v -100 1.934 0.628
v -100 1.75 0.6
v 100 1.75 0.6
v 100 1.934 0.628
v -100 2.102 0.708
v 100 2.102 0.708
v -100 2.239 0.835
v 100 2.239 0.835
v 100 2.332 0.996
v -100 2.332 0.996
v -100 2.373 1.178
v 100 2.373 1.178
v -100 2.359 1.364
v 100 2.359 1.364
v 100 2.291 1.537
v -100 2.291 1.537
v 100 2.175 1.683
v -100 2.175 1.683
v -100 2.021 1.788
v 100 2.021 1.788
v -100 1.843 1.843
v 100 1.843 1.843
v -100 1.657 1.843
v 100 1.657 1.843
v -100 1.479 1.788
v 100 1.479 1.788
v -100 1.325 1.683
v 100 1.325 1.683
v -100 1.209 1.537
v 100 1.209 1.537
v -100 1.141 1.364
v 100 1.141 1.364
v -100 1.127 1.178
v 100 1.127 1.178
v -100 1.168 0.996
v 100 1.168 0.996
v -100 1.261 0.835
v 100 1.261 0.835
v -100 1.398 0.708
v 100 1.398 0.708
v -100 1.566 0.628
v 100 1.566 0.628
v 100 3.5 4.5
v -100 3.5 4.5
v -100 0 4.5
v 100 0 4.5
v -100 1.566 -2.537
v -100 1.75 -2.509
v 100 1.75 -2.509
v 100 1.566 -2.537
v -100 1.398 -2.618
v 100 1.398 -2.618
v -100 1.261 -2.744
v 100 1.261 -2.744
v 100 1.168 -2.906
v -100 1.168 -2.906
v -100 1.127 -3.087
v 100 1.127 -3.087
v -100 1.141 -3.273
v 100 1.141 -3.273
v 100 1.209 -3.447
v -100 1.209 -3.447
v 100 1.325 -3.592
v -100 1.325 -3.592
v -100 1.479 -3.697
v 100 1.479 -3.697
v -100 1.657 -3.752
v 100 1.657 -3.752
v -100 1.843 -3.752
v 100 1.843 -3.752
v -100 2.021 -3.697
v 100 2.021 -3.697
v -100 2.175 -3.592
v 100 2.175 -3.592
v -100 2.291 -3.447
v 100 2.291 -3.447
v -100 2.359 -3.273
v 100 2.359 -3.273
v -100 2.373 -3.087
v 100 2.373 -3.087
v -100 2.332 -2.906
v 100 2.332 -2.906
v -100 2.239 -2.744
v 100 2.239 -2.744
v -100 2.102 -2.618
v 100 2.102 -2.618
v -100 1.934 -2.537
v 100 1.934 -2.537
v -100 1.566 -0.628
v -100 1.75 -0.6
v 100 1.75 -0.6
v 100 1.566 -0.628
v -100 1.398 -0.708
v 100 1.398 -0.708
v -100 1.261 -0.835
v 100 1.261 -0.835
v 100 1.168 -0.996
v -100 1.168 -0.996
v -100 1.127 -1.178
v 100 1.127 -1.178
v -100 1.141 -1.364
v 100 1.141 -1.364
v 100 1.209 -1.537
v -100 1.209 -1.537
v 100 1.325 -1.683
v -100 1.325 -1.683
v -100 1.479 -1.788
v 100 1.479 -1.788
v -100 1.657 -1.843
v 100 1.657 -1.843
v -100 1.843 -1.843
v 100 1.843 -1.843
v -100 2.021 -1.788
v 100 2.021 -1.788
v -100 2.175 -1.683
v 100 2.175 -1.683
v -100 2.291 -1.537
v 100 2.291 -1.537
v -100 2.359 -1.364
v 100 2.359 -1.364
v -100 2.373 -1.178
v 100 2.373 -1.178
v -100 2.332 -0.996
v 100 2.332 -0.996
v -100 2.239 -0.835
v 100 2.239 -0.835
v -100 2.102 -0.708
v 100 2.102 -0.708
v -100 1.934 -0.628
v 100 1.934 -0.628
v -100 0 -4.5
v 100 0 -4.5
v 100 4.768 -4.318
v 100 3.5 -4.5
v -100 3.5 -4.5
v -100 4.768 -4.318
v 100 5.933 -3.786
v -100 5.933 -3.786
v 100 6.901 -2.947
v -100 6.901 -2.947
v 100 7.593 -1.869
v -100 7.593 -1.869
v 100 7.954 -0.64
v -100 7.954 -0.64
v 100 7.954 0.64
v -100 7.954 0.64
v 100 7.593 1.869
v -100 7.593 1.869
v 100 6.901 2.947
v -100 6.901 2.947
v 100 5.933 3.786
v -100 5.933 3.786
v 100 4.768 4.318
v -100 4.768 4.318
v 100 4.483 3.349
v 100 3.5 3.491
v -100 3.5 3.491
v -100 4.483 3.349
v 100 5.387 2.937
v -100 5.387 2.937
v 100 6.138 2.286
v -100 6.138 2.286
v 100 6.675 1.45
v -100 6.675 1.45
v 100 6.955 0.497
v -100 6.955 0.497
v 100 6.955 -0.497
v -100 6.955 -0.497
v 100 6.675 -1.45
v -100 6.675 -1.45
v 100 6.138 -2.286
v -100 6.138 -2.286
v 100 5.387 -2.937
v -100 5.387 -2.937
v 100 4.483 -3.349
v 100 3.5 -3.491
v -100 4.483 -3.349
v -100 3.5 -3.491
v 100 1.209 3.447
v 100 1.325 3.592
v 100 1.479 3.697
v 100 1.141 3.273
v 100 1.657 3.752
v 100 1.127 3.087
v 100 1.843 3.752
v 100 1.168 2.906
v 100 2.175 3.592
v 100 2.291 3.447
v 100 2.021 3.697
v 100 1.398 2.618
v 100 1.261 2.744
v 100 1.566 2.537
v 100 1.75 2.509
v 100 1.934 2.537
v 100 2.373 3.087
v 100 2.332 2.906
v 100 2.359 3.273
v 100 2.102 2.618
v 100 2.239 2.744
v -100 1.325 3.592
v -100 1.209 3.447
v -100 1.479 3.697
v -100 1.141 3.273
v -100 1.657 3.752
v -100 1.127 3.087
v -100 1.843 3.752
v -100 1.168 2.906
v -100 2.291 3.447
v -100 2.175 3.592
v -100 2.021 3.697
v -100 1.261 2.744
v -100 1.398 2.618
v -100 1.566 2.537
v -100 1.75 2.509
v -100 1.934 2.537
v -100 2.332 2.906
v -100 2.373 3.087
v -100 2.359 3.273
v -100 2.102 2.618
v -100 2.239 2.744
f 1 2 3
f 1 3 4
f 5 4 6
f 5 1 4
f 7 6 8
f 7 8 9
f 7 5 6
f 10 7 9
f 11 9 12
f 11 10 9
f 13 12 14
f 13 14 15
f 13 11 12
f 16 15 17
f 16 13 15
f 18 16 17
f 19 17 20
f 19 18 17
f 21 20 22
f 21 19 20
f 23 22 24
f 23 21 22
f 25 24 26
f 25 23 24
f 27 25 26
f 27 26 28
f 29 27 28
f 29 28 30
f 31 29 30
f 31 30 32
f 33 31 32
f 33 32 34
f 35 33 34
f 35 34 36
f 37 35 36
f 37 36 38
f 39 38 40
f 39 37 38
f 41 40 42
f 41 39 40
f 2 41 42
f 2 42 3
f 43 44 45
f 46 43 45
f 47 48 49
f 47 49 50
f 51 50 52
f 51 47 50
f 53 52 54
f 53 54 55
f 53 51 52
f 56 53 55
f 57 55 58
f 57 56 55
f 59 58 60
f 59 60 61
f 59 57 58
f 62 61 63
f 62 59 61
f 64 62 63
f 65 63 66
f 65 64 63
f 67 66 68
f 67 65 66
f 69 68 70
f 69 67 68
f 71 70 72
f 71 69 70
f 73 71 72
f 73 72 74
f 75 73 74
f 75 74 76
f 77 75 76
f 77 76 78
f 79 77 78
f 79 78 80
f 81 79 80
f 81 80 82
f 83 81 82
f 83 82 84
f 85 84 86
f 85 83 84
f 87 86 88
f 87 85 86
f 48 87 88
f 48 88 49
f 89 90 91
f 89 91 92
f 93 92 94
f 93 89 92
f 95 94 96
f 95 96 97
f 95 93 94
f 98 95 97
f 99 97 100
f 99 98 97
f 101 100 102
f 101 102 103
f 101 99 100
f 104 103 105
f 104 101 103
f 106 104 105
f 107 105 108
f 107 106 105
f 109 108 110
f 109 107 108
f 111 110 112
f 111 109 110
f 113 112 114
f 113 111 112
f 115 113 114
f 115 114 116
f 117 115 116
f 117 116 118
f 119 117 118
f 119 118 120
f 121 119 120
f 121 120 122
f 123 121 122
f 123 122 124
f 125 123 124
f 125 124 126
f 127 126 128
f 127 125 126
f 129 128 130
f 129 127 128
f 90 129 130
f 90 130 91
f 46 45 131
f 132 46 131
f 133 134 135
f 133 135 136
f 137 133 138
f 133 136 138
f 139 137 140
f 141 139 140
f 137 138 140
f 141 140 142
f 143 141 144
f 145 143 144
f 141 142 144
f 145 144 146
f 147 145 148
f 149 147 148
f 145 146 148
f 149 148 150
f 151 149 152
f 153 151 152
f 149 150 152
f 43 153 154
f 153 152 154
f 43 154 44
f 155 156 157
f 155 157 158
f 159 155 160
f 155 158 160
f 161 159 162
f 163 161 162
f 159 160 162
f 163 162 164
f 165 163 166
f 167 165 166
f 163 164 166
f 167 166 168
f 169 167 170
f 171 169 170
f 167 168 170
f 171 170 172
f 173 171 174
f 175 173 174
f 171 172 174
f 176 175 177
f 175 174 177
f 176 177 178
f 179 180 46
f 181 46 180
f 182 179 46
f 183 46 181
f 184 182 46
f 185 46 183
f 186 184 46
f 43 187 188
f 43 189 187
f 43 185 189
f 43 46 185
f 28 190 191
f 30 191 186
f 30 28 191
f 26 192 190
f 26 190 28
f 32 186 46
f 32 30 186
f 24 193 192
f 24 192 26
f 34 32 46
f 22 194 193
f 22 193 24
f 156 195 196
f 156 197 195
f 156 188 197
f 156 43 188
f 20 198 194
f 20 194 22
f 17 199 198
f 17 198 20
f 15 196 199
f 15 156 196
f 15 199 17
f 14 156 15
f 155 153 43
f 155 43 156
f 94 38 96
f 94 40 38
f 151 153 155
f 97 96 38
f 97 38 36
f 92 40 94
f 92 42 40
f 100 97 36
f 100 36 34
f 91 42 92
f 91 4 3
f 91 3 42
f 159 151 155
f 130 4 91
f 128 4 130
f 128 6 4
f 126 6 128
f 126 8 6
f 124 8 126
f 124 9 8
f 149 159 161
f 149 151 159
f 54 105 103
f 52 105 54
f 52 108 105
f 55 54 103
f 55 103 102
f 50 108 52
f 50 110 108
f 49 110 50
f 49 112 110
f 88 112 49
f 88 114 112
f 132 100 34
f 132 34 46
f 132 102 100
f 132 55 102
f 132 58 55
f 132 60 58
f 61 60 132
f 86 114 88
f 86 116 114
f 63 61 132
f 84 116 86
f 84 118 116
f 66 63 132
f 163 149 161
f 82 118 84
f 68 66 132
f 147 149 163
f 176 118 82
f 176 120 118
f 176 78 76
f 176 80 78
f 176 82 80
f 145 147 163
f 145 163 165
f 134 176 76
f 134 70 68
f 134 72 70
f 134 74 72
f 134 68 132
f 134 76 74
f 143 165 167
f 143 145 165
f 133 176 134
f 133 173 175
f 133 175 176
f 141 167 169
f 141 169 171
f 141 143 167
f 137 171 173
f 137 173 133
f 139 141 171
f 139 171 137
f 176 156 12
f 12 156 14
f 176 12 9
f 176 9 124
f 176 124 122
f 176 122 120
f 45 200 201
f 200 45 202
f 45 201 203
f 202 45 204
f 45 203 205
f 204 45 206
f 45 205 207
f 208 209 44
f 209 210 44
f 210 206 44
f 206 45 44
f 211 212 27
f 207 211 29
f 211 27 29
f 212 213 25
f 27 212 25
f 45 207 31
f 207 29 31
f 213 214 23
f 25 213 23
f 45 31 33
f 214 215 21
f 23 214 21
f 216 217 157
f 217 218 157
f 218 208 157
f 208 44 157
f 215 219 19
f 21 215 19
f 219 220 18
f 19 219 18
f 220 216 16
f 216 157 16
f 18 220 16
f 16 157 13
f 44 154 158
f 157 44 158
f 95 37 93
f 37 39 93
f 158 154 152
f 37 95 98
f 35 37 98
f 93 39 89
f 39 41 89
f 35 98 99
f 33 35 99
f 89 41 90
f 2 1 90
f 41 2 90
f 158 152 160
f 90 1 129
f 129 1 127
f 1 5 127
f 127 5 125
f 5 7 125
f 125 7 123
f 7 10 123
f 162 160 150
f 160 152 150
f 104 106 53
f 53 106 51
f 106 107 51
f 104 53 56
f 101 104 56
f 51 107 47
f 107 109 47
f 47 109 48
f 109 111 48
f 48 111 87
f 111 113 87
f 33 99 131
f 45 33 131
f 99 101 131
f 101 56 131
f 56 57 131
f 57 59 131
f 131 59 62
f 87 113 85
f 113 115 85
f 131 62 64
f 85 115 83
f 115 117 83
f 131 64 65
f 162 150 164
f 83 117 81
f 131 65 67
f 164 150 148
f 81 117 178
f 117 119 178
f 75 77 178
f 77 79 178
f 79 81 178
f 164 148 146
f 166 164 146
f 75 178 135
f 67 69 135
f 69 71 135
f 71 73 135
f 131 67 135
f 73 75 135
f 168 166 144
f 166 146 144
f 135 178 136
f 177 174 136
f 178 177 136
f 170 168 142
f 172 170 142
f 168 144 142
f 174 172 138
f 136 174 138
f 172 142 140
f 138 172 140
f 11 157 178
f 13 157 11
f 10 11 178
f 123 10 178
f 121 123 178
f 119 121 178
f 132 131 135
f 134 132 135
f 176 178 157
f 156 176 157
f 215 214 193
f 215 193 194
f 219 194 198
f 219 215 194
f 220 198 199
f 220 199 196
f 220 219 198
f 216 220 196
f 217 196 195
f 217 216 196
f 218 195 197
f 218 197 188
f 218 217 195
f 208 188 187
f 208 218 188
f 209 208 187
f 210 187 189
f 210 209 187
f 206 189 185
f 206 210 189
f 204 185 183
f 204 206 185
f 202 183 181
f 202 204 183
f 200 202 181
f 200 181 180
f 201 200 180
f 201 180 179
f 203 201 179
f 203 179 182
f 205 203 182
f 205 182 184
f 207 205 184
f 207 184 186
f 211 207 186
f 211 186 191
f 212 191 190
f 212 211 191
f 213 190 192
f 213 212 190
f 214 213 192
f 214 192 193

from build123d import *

# Parameters (mm, degrees)
EXTRUDE_4_DEPTH      = 100
EXTRUDE_4_DEPTH_BACK = 100
SKETCH_1_4_R         = 0.625


with BuildPart() as part:
    # 草图1<4> → 凸台-拉伸4 (new, two sides: drawn at the far end of the back side and taken through both)
    with BuildSketch(Plane(origin=(0, 0, 0), x_dir=(0, 0, -1), z_dir=(1, 0, 0)).offset(-EXTRUDE_4_DEPTH_BACK)):
        with BuildLine():
            Line((-4.5, 0), (0, 0))
            Line((0, 0), (4.5, 0))
            Line((4.5, 0), (4.5, 3.5))
            ThreePointArc((4.5, 3.5), (0, 8), (-4.5, 3.5))
            Line((-4.5, 3.5), (-4.5, 0))
        make_face()
        with Locations((-3.134058813, 1.75)):
            Circle(SKETCH_1_4_R, mode=Mode.SUBTRACT)
        with Locations((-1.224833948, 1.75)):
            Circle(SKETCH_1_4_R, mode=Mode.SUBTRACT)
        with Locations((1.224833948, 1.75)):
            Circle(SKETCH_1_4_R, mode=Mode.SUBTRACT)
        with Locations((3.134058813, 1.75)):
            Circle(SKETCH_1_4_R, mode=Mode.SUBTRACT)
        with BuildLine():
            Line((3.490727195, 3.5), (-3.490727195, 3.5))
            ThreePointArc((-3.490727195, 3.5), (0, 6.990727195), (3.490727195, 3.5))
        make_face(mode=Mode.SUBTRACT)
    extrude(amount=EXTRUDE_4_DEPTH + EXTRUDE_4_DEPTH_BACK)


solid = part.part
